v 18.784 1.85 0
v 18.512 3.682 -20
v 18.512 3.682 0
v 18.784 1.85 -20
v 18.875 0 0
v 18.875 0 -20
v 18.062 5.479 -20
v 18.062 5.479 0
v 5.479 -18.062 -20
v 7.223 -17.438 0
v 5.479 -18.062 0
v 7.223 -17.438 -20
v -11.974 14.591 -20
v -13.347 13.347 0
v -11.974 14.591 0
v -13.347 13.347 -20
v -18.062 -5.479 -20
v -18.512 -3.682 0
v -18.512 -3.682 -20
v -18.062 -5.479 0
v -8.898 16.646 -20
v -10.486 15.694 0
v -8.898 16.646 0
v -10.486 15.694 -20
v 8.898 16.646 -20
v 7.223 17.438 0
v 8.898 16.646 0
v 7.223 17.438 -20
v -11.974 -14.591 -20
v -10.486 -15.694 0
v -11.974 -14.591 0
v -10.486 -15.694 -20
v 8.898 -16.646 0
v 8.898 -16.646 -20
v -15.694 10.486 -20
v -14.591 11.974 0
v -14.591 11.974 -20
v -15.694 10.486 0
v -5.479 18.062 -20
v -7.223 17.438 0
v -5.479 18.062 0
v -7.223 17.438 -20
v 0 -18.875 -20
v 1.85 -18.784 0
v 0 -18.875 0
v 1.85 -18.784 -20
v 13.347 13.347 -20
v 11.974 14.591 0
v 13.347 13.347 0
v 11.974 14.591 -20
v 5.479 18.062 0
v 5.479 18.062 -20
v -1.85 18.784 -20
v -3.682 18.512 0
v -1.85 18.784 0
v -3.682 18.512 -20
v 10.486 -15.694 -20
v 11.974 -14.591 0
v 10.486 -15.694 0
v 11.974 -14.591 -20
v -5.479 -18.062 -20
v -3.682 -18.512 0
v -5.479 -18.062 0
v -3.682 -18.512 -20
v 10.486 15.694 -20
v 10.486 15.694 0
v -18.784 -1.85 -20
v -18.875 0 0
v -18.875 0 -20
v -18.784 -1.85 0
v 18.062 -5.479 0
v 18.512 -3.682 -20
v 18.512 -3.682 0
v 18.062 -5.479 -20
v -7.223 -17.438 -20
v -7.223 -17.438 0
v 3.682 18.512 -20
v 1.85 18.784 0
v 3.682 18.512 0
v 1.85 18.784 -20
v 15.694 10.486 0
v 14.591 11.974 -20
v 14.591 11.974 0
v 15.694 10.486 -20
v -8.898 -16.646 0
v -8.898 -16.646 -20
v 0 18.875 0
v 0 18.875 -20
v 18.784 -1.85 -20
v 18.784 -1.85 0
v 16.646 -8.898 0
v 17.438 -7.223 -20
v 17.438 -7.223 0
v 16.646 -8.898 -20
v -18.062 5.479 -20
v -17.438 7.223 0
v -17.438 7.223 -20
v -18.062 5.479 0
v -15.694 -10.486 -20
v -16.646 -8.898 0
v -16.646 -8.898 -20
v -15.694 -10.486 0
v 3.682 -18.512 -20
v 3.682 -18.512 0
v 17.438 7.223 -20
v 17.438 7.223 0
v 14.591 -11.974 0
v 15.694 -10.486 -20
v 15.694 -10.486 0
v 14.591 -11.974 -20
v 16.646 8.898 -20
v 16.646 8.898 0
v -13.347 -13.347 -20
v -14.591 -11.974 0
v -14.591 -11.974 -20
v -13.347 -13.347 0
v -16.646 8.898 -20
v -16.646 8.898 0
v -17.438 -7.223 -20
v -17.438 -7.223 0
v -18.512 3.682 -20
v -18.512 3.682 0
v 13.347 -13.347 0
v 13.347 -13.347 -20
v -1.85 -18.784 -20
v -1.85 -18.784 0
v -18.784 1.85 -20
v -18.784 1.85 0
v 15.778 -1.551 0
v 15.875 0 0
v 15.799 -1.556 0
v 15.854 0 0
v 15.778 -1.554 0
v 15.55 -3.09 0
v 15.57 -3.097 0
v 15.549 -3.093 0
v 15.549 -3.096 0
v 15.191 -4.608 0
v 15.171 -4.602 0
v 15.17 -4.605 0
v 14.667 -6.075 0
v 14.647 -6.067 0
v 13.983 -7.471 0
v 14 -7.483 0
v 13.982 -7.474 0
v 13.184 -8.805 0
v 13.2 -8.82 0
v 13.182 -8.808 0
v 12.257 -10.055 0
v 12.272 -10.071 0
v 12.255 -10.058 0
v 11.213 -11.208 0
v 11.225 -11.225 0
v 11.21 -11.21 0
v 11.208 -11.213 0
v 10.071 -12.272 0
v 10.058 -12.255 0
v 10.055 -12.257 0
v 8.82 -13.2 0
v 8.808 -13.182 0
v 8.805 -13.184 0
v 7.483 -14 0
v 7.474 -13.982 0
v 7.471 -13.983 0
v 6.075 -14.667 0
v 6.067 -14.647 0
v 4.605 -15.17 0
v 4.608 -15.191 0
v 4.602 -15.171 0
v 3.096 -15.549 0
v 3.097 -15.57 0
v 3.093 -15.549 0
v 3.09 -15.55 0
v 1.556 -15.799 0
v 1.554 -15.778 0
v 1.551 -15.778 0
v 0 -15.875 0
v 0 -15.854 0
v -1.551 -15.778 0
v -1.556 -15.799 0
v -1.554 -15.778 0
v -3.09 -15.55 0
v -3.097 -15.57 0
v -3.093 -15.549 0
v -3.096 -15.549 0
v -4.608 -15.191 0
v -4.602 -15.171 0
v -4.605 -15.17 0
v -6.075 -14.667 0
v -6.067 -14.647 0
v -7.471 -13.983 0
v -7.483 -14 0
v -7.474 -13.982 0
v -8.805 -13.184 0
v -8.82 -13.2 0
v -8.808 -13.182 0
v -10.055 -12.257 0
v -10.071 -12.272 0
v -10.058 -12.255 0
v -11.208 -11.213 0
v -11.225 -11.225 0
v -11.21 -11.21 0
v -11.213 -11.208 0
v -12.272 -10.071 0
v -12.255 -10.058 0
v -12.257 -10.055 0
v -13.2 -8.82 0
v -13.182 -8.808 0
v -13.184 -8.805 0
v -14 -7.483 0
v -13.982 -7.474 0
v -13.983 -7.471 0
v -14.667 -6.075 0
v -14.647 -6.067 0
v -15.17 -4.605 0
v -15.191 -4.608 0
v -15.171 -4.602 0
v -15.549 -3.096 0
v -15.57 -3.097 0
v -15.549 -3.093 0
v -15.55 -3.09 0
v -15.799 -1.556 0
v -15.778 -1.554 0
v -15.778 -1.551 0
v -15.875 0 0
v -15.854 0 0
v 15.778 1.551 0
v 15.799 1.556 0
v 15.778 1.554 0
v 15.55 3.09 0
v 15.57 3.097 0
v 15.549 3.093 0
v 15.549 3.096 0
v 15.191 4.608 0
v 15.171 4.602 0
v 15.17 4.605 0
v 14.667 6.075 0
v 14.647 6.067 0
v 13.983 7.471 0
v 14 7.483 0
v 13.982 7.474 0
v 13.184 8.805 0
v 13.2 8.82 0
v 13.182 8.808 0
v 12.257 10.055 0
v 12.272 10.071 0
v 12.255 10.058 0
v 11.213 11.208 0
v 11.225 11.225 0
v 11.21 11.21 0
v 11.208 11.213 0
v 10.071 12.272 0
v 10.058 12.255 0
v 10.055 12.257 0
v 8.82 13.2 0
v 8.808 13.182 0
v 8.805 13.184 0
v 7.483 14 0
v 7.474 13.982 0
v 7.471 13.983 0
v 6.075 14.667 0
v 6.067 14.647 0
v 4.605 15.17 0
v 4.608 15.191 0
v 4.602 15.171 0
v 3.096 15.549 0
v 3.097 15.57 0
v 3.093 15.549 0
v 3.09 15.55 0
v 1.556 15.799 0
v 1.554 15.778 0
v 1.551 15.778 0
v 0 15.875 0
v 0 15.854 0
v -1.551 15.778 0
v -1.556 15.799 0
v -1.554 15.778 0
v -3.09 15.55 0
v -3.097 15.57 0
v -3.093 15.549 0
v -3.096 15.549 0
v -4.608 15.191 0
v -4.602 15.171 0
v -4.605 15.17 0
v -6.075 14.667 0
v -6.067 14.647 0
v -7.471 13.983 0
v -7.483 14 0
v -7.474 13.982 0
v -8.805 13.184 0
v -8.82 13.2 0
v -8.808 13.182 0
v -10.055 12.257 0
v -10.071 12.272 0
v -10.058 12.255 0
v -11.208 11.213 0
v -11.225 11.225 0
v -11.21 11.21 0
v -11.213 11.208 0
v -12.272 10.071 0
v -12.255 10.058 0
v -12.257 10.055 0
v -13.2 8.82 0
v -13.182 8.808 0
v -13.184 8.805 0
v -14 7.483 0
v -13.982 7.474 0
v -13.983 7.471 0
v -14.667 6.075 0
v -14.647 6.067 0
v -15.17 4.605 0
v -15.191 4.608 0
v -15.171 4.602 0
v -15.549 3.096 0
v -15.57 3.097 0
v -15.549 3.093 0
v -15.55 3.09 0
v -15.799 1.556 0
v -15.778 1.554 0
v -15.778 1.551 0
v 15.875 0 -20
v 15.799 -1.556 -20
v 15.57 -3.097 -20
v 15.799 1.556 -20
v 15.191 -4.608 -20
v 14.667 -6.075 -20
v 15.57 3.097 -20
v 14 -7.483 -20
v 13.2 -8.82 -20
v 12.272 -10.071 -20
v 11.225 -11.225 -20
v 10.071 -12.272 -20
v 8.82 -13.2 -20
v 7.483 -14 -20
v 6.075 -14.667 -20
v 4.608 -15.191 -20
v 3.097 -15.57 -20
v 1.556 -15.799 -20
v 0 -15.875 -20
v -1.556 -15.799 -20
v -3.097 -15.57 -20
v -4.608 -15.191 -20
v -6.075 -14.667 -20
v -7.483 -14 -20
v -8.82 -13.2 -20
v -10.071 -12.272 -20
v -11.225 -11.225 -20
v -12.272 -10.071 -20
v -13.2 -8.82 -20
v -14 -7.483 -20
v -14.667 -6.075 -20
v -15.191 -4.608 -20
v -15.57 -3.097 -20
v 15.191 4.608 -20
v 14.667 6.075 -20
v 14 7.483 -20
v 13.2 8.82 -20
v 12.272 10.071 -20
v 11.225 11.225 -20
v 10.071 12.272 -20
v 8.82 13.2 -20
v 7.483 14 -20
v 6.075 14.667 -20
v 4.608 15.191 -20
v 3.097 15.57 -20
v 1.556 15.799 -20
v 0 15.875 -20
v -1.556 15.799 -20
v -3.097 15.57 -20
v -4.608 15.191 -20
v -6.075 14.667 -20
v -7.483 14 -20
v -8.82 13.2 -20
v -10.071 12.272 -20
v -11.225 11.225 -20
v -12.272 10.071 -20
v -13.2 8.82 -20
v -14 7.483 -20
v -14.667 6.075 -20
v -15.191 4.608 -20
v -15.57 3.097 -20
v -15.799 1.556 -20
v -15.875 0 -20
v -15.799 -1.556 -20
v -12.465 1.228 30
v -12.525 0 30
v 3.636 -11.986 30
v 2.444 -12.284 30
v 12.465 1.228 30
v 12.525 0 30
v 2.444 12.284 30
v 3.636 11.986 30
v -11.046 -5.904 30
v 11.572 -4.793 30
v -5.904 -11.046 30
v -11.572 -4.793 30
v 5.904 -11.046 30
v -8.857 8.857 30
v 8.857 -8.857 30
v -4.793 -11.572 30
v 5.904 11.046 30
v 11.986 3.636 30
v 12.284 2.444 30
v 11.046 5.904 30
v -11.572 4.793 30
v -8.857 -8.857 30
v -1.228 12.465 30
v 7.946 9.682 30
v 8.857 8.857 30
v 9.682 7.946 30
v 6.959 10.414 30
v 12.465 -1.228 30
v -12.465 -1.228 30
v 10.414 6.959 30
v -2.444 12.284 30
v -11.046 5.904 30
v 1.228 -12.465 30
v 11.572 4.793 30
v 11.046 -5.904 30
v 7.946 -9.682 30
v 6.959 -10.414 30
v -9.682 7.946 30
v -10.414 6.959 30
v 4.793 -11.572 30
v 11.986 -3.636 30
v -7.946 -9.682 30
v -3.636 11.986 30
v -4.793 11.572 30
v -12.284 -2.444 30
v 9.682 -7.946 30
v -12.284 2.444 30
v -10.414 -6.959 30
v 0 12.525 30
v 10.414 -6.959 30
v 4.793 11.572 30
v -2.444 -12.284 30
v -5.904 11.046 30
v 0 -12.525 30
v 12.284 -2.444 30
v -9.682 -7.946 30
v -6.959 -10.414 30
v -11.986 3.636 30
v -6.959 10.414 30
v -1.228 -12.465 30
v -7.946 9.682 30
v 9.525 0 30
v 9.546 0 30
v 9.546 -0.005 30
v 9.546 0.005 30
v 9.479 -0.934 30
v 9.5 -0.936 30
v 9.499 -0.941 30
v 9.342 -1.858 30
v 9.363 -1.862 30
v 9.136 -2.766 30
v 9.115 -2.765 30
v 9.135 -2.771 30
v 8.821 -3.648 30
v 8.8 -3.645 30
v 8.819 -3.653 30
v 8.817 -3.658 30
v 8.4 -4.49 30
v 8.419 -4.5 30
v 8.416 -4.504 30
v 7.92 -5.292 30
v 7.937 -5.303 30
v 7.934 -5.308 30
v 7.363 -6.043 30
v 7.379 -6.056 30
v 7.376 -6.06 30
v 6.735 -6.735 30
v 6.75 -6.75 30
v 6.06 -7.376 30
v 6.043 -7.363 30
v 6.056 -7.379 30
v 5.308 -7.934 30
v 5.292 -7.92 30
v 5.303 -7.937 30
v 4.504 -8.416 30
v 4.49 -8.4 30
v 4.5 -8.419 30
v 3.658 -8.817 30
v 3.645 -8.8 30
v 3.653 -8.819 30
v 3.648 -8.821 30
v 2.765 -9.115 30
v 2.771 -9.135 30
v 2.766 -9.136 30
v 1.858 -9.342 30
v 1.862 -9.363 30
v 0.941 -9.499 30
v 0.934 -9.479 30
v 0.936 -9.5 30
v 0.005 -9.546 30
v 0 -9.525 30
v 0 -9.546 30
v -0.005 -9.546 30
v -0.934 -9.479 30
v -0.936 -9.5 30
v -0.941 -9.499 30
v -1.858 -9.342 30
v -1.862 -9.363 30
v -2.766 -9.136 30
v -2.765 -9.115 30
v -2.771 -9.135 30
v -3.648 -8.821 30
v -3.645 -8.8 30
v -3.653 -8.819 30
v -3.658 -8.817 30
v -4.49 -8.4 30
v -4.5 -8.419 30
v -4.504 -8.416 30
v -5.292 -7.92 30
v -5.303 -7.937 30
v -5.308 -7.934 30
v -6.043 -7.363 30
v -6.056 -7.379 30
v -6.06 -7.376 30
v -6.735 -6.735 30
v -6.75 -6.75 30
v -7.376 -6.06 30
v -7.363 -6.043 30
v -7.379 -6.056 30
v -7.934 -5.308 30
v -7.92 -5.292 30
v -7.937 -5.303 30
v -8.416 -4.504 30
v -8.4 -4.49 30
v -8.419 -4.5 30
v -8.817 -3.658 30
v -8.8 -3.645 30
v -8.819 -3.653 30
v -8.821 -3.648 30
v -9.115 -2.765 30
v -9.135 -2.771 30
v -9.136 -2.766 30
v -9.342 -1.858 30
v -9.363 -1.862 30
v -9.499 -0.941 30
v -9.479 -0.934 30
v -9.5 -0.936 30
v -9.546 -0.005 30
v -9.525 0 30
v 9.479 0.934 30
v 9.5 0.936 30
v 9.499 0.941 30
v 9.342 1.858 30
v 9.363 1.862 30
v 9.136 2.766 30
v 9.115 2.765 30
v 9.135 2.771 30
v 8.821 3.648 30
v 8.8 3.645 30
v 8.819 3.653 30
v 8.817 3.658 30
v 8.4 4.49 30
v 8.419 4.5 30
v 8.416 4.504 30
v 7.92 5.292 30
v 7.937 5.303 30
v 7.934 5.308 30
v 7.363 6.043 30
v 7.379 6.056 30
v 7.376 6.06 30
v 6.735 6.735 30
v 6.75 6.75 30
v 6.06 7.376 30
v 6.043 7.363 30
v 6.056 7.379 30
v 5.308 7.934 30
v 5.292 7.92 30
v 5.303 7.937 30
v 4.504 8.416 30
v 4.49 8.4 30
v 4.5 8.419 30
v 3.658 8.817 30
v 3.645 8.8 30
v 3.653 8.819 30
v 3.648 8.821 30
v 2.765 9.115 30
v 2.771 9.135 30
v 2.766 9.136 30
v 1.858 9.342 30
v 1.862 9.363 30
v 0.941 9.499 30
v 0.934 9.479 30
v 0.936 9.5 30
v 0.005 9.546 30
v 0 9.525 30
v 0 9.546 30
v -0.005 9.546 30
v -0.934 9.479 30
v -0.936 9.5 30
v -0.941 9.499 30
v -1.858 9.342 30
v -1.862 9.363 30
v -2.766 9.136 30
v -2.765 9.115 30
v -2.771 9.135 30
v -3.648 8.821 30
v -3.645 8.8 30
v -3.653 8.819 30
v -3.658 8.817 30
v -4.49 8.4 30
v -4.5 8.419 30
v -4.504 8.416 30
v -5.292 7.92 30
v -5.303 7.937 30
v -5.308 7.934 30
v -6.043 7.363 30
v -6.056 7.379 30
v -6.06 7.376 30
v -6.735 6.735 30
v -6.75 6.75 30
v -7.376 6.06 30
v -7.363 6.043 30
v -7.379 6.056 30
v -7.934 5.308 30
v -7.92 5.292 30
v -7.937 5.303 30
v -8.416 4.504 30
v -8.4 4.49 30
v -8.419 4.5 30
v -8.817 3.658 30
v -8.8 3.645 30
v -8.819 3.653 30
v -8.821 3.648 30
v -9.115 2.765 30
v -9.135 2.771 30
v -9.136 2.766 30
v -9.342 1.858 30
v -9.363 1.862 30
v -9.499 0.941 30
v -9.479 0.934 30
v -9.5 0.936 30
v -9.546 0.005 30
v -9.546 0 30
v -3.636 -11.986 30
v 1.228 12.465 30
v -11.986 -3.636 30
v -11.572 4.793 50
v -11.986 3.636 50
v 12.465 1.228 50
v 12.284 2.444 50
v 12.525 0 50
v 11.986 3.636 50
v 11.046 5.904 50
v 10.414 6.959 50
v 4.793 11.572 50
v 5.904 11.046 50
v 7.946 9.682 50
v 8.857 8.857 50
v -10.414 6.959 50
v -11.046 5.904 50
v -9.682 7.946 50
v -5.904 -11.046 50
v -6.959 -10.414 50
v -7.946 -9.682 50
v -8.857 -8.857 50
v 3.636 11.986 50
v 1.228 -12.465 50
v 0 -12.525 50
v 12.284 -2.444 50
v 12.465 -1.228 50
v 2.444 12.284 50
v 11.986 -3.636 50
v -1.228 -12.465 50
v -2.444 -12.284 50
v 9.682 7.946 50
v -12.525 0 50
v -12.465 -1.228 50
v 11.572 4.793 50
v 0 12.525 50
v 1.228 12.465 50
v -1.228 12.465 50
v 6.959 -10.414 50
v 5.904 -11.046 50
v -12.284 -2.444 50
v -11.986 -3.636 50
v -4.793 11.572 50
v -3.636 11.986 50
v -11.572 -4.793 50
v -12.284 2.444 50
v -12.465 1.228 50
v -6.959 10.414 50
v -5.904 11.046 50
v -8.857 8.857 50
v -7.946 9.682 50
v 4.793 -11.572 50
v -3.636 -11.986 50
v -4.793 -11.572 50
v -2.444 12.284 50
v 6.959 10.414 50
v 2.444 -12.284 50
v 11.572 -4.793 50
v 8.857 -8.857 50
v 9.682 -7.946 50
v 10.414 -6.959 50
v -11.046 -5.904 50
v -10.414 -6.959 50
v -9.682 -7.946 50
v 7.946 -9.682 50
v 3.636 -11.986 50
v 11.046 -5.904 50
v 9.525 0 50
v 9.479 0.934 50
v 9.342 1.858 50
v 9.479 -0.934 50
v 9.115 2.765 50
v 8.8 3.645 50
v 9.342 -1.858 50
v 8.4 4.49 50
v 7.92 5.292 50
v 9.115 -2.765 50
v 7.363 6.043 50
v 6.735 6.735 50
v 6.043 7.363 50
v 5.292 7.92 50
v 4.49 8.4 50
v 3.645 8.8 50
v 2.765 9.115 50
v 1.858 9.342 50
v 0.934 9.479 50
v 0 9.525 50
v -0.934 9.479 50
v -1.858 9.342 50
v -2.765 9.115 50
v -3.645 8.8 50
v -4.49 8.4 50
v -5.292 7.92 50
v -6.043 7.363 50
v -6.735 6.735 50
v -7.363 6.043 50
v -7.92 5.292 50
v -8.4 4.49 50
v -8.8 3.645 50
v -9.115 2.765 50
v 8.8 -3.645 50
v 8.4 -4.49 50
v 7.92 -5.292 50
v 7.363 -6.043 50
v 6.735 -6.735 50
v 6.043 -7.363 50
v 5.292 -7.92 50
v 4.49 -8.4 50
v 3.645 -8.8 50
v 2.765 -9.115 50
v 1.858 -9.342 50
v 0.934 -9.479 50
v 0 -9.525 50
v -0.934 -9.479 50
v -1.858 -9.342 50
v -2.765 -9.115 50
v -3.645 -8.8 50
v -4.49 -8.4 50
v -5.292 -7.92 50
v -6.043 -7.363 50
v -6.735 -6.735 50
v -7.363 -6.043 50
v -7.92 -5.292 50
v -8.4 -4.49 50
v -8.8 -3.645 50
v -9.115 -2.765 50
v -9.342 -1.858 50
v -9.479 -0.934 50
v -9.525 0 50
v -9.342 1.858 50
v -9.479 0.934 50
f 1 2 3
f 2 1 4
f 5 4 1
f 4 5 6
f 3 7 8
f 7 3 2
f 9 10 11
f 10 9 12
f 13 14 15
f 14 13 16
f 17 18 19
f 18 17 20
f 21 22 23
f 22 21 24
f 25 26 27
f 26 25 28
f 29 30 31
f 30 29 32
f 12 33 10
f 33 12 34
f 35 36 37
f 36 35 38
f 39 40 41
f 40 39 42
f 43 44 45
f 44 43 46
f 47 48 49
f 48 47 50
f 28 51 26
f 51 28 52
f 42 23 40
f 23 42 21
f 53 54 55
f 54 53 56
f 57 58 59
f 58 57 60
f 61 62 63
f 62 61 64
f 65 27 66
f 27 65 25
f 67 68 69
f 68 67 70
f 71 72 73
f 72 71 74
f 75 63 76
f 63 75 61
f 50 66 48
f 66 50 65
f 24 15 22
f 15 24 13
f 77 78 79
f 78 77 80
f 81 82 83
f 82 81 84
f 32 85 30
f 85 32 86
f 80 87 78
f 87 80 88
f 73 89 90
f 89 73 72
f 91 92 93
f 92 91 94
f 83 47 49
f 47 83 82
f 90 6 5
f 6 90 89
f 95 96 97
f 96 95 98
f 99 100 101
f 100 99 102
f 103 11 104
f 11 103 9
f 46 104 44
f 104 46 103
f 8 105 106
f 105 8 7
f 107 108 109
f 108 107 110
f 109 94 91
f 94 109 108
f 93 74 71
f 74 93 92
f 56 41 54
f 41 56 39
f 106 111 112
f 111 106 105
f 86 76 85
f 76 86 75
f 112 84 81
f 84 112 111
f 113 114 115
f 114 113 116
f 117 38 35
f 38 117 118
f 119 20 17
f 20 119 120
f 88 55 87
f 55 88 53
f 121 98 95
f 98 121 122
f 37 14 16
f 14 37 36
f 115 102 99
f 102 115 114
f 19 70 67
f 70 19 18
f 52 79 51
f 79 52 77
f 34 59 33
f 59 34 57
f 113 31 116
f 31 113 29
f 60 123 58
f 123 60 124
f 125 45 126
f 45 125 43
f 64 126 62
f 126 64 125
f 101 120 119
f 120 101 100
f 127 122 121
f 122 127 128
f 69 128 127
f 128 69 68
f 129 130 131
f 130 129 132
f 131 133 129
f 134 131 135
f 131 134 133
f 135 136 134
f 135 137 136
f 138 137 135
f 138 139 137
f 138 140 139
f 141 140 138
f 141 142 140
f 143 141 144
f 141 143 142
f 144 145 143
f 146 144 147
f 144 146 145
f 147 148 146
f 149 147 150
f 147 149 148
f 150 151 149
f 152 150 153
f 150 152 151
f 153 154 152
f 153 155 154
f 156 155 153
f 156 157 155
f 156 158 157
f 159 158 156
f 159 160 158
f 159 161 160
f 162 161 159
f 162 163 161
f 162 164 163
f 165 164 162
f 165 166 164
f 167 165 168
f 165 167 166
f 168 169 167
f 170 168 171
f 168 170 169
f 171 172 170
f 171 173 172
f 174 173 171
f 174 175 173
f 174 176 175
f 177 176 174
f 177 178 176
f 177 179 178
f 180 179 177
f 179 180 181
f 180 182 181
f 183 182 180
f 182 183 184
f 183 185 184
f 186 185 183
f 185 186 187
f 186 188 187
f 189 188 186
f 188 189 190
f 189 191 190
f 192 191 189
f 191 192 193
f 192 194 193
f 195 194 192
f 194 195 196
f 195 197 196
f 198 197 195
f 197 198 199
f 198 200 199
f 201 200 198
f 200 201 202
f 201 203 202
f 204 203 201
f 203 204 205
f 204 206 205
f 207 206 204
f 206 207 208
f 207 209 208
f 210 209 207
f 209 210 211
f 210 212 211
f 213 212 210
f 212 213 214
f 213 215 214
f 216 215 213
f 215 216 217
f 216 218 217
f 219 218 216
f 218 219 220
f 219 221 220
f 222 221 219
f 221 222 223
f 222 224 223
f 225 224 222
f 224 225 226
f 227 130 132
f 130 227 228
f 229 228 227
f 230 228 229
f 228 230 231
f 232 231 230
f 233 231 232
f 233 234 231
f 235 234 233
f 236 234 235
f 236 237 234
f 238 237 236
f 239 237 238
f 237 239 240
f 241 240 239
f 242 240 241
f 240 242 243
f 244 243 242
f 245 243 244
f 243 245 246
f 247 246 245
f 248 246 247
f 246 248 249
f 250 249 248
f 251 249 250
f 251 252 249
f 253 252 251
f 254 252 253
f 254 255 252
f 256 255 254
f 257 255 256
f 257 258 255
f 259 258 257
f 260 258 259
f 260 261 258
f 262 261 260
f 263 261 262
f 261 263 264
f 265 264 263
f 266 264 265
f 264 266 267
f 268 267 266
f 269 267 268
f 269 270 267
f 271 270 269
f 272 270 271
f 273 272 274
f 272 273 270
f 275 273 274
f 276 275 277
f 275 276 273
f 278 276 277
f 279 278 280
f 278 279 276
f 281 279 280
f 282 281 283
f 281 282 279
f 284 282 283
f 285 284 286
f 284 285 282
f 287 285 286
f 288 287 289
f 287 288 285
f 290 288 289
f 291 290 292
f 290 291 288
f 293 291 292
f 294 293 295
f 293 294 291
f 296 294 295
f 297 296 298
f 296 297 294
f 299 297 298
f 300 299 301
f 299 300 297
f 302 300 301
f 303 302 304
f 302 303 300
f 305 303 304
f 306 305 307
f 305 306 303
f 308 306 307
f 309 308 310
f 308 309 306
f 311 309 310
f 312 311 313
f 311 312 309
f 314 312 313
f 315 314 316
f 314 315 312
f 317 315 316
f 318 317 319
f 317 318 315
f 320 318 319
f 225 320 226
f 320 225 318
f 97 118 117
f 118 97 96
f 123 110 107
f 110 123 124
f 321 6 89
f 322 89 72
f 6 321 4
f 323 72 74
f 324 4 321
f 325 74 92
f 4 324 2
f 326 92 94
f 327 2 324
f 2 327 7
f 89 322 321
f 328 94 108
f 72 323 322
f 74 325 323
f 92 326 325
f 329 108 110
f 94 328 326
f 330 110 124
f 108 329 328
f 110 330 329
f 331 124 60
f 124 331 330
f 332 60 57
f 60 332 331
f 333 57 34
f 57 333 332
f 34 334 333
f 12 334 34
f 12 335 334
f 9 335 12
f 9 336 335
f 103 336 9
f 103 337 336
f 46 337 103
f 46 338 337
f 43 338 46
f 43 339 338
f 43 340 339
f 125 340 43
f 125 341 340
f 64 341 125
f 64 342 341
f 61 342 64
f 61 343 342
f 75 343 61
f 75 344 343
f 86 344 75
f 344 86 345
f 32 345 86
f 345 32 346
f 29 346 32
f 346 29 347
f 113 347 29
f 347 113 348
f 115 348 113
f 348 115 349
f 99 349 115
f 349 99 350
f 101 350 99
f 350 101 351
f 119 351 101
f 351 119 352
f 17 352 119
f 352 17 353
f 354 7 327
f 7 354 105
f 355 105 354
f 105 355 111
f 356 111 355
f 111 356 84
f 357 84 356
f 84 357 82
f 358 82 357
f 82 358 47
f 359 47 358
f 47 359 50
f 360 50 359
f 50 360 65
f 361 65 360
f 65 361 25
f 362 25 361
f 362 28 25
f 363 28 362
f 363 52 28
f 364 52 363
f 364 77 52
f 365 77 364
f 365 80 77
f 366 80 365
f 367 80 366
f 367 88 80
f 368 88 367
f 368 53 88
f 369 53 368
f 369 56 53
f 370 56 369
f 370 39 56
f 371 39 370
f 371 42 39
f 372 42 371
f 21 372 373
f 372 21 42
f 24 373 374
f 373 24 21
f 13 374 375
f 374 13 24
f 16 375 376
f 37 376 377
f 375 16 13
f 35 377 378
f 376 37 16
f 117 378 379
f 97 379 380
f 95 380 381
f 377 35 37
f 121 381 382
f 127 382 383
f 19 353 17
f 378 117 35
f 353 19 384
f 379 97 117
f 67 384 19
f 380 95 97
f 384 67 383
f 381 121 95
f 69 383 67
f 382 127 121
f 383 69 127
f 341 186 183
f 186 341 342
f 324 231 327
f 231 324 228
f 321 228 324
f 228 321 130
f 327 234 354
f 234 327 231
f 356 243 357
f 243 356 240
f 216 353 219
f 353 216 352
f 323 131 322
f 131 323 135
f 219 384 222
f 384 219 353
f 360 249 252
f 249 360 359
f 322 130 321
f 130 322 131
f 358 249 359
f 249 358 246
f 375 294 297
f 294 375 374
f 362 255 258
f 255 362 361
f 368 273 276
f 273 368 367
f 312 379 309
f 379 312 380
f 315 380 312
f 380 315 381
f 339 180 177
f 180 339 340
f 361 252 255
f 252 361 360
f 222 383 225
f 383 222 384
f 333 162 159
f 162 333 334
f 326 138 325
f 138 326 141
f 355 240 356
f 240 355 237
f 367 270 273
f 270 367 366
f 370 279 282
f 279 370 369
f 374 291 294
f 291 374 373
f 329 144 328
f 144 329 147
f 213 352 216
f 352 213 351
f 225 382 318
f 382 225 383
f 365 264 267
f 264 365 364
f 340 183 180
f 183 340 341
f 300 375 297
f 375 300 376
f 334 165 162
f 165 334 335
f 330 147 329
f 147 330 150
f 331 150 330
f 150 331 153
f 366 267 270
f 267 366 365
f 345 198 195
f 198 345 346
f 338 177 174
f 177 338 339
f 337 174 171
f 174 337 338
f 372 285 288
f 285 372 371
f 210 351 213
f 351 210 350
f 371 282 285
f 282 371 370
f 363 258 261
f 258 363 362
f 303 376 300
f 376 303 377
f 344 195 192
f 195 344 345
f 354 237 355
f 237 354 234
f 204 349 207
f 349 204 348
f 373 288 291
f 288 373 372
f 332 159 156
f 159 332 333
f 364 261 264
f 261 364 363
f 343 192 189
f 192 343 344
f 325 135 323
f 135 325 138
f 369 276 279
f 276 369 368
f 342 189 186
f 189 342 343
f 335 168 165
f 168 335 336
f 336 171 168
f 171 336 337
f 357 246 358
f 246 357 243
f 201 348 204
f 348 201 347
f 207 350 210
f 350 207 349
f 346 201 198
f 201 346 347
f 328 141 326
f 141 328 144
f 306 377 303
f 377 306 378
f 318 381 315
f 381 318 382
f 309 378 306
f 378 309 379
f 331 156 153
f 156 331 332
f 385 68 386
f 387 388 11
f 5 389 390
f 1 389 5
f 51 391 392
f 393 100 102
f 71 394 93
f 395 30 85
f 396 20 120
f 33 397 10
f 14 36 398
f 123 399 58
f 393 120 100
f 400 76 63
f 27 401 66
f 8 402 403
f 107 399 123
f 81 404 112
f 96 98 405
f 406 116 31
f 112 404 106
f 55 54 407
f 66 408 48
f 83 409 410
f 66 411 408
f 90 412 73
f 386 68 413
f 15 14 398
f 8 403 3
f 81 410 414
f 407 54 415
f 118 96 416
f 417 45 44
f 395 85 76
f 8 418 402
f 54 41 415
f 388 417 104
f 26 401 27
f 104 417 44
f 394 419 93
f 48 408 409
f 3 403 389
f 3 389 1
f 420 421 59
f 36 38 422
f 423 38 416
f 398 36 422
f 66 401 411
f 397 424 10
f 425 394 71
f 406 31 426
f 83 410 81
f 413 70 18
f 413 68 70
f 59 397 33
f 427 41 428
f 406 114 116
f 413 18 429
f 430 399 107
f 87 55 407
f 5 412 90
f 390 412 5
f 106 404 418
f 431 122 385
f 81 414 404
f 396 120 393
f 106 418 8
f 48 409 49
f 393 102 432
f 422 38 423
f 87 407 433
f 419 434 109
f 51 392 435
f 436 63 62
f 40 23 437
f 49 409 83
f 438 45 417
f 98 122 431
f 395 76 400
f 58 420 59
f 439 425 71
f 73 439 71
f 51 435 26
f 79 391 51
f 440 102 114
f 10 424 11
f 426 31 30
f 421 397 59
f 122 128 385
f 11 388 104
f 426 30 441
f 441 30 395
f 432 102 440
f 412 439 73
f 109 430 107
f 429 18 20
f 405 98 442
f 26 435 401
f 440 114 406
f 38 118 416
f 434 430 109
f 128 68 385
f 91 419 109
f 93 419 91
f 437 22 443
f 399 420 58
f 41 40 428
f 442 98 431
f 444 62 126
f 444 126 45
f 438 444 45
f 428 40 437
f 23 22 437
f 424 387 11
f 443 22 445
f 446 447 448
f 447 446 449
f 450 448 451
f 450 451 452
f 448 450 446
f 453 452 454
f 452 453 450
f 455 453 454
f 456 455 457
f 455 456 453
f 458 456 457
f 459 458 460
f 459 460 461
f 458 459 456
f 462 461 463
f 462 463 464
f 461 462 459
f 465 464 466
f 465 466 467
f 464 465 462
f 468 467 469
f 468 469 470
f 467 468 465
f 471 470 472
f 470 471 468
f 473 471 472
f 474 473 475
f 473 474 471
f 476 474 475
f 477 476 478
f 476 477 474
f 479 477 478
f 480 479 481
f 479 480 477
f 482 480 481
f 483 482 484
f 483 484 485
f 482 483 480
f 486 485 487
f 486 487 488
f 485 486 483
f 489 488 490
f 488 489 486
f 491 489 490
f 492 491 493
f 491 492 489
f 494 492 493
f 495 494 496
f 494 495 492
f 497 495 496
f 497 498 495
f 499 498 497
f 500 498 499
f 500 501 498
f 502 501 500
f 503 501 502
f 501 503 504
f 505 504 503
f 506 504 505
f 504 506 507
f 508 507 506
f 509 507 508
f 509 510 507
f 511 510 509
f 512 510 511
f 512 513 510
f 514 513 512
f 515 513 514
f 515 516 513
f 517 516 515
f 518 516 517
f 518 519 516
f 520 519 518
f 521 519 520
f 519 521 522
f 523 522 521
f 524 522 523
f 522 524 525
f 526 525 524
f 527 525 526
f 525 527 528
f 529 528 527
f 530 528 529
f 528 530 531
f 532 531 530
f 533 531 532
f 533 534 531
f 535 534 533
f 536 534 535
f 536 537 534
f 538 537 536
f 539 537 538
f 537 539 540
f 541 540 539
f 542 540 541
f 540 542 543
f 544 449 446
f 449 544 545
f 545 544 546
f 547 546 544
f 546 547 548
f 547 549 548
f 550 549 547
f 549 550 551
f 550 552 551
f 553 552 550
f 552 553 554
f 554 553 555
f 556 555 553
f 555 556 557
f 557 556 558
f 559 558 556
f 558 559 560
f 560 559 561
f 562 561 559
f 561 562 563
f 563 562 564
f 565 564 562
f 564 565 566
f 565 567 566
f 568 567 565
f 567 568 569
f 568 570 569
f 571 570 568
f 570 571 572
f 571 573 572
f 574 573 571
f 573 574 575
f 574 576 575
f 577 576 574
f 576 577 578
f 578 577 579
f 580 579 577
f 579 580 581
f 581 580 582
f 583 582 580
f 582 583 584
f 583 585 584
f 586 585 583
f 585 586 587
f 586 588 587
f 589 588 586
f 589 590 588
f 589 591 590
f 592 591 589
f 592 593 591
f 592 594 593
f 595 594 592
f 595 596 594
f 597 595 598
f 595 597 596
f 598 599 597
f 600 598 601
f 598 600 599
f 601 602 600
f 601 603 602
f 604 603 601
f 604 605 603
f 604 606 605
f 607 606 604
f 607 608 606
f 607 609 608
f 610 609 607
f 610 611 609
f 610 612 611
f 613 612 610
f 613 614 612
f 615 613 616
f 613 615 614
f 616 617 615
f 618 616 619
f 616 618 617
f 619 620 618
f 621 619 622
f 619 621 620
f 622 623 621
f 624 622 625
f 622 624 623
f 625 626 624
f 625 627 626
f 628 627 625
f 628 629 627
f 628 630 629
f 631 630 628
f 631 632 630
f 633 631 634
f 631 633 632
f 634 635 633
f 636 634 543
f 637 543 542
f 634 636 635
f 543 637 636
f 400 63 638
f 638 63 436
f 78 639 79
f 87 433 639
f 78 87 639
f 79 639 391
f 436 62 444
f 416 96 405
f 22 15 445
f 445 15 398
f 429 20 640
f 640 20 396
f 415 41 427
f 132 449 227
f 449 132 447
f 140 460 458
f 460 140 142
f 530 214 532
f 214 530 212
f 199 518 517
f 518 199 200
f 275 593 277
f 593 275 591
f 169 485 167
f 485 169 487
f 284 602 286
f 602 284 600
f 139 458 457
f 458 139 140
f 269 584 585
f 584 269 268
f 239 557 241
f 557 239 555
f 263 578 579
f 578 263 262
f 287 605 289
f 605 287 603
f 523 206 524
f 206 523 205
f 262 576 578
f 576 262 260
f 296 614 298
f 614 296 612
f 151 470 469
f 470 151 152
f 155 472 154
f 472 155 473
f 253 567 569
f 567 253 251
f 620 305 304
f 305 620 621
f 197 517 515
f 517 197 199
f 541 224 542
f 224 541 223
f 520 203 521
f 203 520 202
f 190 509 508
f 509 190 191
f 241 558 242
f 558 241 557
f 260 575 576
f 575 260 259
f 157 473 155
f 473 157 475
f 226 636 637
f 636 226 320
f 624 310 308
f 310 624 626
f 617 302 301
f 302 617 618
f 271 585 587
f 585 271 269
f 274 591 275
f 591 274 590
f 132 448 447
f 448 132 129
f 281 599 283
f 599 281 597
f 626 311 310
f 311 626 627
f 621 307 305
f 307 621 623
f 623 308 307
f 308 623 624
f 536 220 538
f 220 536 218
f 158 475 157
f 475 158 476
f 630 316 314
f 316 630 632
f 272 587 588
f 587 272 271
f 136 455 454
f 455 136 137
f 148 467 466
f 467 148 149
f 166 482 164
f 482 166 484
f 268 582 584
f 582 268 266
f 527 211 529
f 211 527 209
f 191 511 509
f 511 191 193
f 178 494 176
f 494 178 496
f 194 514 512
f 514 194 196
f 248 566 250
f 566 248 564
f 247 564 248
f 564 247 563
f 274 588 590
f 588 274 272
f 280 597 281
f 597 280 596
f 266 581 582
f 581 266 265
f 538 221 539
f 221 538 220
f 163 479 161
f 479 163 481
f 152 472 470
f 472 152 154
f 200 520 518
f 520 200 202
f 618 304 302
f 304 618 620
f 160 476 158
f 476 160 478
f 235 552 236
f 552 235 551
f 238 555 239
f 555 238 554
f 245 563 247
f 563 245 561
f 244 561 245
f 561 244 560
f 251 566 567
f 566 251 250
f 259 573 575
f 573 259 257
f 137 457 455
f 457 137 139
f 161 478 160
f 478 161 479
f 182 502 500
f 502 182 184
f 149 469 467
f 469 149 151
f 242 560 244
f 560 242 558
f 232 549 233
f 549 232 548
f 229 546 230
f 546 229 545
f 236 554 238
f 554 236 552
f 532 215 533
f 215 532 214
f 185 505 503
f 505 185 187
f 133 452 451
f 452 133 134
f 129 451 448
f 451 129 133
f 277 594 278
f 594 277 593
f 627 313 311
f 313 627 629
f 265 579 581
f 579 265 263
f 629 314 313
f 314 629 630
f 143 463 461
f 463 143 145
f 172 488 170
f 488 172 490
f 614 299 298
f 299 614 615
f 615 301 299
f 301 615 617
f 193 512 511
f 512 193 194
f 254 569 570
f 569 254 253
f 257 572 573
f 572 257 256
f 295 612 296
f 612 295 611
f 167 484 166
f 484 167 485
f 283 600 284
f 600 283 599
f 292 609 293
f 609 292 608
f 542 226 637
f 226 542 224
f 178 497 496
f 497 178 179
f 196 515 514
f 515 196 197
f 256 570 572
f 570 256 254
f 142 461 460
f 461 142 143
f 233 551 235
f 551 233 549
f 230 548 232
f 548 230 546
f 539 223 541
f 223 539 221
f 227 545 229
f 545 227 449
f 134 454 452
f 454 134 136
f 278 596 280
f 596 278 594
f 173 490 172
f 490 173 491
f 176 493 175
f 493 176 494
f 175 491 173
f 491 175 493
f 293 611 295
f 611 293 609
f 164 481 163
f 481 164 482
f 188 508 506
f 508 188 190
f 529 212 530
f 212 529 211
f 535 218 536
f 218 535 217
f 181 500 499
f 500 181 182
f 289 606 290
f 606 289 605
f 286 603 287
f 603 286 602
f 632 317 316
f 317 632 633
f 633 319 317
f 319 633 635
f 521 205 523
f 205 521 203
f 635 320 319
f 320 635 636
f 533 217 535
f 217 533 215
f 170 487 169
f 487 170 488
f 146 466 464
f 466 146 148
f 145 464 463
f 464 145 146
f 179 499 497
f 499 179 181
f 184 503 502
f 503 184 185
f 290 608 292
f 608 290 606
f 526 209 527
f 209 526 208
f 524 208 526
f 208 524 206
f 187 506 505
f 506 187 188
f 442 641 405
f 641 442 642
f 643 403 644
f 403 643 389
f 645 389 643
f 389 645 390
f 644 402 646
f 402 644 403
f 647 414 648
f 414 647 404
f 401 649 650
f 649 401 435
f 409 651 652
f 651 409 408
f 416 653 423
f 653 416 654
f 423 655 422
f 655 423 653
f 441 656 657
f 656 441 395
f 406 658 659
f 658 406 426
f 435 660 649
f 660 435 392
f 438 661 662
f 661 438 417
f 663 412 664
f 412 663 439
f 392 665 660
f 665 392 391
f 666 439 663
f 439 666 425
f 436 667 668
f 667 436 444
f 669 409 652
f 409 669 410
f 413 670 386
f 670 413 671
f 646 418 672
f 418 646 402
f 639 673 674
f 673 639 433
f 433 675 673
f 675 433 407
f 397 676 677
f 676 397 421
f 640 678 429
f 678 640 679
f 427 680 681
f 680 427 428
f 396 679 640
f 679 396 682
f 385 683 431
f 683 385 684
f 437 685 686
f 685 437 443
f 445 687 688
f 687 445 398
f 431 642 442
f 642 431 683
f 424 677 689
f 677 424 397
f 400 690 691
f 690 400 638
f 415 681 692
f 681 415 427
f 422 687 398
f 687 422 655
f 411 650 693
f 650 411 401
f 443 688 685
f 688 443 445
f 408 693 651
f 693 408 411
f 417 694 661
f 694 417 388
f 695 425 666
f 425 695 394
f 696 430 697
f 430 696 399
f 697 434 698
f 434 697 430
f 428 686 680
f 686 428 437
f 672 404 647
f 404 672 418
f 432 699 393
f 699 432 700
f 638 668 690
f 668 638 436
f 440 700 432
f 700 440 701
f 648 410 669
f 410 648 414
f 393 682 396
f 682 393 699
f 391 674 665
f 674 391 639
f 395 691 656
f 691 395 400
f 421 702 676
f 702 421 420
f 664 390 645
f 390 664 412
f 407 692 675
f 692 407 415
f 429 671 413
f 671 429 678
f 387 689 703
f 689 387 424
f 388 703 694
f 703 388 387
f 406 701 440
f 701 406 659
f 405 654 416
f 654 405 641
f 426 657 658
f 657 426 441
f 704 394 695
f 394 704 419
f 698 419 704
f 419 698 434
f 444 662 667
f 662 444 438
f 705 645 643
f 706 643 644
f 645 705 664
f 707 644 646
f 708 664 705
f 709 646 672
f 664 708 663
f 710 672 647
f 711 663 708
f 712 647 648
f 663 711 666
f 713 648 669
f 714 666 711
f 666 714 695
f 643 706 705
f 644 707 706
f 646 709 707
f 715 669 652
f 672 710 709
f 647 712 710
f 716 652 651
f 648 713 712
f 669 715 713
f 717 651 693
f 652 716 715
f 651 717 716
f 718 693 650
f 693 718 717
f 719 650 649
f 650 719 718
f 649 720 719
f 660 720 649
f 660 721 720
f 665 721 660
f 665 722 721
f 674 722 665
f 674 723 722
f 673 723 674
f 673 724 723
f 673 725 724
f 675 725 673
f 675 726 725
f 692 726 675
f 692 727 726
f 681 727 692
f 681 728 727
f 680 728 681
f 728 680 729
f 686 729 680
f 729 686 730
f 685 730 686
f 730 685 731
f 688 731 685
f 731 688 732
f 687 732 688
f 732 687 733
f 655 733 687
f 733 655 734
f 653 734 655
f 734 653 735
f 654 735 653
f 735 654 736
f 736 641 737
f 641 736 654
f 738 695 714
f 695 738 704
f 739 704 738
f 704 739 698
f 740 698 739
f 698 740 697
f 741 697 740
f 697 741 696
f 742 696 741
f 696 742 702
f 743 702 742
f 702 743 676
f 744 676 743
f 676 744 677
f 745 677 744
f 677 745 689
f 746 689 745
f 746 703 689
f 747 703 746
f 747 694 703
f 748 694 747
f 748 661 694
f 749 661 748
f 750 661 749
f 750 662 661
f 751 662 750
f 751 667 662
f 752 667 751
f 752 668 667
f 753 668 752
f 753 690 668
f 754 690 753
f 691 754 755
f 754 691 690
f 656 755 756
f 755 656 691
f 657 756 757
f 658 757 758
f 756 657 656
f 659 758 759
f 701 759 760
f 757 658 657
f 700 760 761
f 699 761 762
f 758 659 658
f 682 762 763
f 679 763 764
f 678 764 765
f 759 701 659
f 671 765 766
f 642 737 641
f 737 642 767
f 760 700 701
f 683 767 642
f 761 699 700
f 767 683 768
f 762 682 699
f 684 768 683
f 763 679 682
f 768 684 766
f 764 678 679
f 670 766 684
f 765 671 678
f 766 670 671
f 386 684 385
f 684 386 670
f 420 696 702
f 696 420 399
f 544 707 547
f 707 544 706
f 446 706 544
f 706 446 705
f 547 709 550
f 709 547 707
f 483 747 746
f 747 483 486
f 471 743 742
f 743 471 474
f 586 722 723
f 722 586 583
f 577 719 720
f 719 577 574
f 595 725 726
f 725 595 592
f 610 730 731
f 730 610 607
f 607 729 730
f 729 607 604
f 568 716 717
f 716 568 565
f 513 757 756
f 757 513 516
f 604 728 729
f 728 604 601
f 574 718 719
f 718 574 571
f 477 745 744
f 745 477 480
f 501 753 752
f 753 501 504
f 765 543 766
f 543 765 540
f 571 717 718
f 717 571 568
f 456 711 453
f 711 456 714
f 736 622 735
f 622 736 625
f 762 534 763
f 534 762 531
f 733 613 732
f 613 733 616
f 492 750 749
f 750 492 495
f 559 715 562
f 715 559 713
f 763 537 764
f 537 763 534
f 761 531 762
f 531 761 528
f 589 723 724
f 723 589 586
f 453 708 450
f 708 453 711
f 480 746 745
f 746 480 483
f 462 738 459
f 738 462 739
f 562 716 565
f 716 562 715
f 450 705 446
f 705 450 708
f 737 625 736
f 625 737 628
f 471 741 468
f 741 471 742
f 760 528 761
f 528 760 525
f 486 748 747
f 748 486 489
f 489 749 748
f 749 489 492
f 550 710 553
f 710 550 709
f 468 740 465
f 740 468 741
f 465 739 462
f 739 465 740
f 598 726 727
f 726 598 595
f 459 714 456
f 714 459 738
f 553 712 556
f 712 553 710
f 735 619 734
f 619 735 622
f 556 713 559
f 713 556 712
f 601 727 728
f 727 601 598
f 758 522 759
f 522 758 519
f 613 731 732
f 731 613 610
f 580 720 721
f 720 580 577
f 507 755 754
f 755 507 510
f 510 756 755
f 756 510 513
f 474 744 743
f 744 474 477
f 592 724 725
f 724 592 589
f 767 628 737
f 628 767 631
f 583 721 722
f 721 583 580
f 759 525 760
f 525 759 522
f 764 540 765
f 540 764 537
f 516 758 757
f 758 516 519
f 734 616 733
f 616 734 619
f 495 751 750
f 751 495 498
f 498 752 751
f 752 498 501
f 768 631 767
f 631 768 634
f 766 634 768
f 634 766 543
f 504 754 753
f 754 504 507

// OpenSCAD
// Parametric Pipe Reducer
// Parameters are injected via OpenSCAD -D flags

// Large end inner diameter (mm)
id_large = 31.75;  // 1.25 inch default
// Small end inner diameter (mm)
id_small = 19.05;  // 0.75 inch default
// Wall thickness (mm)
wall_thickness = 3;
// Transition length (mm)
transition_length = 30;
// Straight stub length on each end (mm)
stub_length = 20;
// Resolution
$fn = 64;

od_large = id_large + 2 * wall_thickness;
od_small = id_small + 2 * wall_thickness;

module reducer() {
    // Large stub
    translate([0, 0, -stub_length])
    difference() {
        cylinder(h = stub_length, d = od_large);
        translate([0, 0, -0.1])
            cylinder(h = stub_length + 0.2, d = id_large);
    }

    // Transition section
    difference() {
        cylinder(h = transition_length, d1 = od_large, d2 = od_small);
        translate([0, 0, -0.1])
            cylinder(h = transition_length + 0.2, d1 = id_large, d2 = id_small);
    }

    // Small stub
    translate([0, 0, transition_length])
    difference() {
        cylinder(h = stub_length, d = od_small);
        translate([0, 0, -0.1])
            cylinder(h = stub_length + 0.2, d = id_small);
    }
}

reducer();
